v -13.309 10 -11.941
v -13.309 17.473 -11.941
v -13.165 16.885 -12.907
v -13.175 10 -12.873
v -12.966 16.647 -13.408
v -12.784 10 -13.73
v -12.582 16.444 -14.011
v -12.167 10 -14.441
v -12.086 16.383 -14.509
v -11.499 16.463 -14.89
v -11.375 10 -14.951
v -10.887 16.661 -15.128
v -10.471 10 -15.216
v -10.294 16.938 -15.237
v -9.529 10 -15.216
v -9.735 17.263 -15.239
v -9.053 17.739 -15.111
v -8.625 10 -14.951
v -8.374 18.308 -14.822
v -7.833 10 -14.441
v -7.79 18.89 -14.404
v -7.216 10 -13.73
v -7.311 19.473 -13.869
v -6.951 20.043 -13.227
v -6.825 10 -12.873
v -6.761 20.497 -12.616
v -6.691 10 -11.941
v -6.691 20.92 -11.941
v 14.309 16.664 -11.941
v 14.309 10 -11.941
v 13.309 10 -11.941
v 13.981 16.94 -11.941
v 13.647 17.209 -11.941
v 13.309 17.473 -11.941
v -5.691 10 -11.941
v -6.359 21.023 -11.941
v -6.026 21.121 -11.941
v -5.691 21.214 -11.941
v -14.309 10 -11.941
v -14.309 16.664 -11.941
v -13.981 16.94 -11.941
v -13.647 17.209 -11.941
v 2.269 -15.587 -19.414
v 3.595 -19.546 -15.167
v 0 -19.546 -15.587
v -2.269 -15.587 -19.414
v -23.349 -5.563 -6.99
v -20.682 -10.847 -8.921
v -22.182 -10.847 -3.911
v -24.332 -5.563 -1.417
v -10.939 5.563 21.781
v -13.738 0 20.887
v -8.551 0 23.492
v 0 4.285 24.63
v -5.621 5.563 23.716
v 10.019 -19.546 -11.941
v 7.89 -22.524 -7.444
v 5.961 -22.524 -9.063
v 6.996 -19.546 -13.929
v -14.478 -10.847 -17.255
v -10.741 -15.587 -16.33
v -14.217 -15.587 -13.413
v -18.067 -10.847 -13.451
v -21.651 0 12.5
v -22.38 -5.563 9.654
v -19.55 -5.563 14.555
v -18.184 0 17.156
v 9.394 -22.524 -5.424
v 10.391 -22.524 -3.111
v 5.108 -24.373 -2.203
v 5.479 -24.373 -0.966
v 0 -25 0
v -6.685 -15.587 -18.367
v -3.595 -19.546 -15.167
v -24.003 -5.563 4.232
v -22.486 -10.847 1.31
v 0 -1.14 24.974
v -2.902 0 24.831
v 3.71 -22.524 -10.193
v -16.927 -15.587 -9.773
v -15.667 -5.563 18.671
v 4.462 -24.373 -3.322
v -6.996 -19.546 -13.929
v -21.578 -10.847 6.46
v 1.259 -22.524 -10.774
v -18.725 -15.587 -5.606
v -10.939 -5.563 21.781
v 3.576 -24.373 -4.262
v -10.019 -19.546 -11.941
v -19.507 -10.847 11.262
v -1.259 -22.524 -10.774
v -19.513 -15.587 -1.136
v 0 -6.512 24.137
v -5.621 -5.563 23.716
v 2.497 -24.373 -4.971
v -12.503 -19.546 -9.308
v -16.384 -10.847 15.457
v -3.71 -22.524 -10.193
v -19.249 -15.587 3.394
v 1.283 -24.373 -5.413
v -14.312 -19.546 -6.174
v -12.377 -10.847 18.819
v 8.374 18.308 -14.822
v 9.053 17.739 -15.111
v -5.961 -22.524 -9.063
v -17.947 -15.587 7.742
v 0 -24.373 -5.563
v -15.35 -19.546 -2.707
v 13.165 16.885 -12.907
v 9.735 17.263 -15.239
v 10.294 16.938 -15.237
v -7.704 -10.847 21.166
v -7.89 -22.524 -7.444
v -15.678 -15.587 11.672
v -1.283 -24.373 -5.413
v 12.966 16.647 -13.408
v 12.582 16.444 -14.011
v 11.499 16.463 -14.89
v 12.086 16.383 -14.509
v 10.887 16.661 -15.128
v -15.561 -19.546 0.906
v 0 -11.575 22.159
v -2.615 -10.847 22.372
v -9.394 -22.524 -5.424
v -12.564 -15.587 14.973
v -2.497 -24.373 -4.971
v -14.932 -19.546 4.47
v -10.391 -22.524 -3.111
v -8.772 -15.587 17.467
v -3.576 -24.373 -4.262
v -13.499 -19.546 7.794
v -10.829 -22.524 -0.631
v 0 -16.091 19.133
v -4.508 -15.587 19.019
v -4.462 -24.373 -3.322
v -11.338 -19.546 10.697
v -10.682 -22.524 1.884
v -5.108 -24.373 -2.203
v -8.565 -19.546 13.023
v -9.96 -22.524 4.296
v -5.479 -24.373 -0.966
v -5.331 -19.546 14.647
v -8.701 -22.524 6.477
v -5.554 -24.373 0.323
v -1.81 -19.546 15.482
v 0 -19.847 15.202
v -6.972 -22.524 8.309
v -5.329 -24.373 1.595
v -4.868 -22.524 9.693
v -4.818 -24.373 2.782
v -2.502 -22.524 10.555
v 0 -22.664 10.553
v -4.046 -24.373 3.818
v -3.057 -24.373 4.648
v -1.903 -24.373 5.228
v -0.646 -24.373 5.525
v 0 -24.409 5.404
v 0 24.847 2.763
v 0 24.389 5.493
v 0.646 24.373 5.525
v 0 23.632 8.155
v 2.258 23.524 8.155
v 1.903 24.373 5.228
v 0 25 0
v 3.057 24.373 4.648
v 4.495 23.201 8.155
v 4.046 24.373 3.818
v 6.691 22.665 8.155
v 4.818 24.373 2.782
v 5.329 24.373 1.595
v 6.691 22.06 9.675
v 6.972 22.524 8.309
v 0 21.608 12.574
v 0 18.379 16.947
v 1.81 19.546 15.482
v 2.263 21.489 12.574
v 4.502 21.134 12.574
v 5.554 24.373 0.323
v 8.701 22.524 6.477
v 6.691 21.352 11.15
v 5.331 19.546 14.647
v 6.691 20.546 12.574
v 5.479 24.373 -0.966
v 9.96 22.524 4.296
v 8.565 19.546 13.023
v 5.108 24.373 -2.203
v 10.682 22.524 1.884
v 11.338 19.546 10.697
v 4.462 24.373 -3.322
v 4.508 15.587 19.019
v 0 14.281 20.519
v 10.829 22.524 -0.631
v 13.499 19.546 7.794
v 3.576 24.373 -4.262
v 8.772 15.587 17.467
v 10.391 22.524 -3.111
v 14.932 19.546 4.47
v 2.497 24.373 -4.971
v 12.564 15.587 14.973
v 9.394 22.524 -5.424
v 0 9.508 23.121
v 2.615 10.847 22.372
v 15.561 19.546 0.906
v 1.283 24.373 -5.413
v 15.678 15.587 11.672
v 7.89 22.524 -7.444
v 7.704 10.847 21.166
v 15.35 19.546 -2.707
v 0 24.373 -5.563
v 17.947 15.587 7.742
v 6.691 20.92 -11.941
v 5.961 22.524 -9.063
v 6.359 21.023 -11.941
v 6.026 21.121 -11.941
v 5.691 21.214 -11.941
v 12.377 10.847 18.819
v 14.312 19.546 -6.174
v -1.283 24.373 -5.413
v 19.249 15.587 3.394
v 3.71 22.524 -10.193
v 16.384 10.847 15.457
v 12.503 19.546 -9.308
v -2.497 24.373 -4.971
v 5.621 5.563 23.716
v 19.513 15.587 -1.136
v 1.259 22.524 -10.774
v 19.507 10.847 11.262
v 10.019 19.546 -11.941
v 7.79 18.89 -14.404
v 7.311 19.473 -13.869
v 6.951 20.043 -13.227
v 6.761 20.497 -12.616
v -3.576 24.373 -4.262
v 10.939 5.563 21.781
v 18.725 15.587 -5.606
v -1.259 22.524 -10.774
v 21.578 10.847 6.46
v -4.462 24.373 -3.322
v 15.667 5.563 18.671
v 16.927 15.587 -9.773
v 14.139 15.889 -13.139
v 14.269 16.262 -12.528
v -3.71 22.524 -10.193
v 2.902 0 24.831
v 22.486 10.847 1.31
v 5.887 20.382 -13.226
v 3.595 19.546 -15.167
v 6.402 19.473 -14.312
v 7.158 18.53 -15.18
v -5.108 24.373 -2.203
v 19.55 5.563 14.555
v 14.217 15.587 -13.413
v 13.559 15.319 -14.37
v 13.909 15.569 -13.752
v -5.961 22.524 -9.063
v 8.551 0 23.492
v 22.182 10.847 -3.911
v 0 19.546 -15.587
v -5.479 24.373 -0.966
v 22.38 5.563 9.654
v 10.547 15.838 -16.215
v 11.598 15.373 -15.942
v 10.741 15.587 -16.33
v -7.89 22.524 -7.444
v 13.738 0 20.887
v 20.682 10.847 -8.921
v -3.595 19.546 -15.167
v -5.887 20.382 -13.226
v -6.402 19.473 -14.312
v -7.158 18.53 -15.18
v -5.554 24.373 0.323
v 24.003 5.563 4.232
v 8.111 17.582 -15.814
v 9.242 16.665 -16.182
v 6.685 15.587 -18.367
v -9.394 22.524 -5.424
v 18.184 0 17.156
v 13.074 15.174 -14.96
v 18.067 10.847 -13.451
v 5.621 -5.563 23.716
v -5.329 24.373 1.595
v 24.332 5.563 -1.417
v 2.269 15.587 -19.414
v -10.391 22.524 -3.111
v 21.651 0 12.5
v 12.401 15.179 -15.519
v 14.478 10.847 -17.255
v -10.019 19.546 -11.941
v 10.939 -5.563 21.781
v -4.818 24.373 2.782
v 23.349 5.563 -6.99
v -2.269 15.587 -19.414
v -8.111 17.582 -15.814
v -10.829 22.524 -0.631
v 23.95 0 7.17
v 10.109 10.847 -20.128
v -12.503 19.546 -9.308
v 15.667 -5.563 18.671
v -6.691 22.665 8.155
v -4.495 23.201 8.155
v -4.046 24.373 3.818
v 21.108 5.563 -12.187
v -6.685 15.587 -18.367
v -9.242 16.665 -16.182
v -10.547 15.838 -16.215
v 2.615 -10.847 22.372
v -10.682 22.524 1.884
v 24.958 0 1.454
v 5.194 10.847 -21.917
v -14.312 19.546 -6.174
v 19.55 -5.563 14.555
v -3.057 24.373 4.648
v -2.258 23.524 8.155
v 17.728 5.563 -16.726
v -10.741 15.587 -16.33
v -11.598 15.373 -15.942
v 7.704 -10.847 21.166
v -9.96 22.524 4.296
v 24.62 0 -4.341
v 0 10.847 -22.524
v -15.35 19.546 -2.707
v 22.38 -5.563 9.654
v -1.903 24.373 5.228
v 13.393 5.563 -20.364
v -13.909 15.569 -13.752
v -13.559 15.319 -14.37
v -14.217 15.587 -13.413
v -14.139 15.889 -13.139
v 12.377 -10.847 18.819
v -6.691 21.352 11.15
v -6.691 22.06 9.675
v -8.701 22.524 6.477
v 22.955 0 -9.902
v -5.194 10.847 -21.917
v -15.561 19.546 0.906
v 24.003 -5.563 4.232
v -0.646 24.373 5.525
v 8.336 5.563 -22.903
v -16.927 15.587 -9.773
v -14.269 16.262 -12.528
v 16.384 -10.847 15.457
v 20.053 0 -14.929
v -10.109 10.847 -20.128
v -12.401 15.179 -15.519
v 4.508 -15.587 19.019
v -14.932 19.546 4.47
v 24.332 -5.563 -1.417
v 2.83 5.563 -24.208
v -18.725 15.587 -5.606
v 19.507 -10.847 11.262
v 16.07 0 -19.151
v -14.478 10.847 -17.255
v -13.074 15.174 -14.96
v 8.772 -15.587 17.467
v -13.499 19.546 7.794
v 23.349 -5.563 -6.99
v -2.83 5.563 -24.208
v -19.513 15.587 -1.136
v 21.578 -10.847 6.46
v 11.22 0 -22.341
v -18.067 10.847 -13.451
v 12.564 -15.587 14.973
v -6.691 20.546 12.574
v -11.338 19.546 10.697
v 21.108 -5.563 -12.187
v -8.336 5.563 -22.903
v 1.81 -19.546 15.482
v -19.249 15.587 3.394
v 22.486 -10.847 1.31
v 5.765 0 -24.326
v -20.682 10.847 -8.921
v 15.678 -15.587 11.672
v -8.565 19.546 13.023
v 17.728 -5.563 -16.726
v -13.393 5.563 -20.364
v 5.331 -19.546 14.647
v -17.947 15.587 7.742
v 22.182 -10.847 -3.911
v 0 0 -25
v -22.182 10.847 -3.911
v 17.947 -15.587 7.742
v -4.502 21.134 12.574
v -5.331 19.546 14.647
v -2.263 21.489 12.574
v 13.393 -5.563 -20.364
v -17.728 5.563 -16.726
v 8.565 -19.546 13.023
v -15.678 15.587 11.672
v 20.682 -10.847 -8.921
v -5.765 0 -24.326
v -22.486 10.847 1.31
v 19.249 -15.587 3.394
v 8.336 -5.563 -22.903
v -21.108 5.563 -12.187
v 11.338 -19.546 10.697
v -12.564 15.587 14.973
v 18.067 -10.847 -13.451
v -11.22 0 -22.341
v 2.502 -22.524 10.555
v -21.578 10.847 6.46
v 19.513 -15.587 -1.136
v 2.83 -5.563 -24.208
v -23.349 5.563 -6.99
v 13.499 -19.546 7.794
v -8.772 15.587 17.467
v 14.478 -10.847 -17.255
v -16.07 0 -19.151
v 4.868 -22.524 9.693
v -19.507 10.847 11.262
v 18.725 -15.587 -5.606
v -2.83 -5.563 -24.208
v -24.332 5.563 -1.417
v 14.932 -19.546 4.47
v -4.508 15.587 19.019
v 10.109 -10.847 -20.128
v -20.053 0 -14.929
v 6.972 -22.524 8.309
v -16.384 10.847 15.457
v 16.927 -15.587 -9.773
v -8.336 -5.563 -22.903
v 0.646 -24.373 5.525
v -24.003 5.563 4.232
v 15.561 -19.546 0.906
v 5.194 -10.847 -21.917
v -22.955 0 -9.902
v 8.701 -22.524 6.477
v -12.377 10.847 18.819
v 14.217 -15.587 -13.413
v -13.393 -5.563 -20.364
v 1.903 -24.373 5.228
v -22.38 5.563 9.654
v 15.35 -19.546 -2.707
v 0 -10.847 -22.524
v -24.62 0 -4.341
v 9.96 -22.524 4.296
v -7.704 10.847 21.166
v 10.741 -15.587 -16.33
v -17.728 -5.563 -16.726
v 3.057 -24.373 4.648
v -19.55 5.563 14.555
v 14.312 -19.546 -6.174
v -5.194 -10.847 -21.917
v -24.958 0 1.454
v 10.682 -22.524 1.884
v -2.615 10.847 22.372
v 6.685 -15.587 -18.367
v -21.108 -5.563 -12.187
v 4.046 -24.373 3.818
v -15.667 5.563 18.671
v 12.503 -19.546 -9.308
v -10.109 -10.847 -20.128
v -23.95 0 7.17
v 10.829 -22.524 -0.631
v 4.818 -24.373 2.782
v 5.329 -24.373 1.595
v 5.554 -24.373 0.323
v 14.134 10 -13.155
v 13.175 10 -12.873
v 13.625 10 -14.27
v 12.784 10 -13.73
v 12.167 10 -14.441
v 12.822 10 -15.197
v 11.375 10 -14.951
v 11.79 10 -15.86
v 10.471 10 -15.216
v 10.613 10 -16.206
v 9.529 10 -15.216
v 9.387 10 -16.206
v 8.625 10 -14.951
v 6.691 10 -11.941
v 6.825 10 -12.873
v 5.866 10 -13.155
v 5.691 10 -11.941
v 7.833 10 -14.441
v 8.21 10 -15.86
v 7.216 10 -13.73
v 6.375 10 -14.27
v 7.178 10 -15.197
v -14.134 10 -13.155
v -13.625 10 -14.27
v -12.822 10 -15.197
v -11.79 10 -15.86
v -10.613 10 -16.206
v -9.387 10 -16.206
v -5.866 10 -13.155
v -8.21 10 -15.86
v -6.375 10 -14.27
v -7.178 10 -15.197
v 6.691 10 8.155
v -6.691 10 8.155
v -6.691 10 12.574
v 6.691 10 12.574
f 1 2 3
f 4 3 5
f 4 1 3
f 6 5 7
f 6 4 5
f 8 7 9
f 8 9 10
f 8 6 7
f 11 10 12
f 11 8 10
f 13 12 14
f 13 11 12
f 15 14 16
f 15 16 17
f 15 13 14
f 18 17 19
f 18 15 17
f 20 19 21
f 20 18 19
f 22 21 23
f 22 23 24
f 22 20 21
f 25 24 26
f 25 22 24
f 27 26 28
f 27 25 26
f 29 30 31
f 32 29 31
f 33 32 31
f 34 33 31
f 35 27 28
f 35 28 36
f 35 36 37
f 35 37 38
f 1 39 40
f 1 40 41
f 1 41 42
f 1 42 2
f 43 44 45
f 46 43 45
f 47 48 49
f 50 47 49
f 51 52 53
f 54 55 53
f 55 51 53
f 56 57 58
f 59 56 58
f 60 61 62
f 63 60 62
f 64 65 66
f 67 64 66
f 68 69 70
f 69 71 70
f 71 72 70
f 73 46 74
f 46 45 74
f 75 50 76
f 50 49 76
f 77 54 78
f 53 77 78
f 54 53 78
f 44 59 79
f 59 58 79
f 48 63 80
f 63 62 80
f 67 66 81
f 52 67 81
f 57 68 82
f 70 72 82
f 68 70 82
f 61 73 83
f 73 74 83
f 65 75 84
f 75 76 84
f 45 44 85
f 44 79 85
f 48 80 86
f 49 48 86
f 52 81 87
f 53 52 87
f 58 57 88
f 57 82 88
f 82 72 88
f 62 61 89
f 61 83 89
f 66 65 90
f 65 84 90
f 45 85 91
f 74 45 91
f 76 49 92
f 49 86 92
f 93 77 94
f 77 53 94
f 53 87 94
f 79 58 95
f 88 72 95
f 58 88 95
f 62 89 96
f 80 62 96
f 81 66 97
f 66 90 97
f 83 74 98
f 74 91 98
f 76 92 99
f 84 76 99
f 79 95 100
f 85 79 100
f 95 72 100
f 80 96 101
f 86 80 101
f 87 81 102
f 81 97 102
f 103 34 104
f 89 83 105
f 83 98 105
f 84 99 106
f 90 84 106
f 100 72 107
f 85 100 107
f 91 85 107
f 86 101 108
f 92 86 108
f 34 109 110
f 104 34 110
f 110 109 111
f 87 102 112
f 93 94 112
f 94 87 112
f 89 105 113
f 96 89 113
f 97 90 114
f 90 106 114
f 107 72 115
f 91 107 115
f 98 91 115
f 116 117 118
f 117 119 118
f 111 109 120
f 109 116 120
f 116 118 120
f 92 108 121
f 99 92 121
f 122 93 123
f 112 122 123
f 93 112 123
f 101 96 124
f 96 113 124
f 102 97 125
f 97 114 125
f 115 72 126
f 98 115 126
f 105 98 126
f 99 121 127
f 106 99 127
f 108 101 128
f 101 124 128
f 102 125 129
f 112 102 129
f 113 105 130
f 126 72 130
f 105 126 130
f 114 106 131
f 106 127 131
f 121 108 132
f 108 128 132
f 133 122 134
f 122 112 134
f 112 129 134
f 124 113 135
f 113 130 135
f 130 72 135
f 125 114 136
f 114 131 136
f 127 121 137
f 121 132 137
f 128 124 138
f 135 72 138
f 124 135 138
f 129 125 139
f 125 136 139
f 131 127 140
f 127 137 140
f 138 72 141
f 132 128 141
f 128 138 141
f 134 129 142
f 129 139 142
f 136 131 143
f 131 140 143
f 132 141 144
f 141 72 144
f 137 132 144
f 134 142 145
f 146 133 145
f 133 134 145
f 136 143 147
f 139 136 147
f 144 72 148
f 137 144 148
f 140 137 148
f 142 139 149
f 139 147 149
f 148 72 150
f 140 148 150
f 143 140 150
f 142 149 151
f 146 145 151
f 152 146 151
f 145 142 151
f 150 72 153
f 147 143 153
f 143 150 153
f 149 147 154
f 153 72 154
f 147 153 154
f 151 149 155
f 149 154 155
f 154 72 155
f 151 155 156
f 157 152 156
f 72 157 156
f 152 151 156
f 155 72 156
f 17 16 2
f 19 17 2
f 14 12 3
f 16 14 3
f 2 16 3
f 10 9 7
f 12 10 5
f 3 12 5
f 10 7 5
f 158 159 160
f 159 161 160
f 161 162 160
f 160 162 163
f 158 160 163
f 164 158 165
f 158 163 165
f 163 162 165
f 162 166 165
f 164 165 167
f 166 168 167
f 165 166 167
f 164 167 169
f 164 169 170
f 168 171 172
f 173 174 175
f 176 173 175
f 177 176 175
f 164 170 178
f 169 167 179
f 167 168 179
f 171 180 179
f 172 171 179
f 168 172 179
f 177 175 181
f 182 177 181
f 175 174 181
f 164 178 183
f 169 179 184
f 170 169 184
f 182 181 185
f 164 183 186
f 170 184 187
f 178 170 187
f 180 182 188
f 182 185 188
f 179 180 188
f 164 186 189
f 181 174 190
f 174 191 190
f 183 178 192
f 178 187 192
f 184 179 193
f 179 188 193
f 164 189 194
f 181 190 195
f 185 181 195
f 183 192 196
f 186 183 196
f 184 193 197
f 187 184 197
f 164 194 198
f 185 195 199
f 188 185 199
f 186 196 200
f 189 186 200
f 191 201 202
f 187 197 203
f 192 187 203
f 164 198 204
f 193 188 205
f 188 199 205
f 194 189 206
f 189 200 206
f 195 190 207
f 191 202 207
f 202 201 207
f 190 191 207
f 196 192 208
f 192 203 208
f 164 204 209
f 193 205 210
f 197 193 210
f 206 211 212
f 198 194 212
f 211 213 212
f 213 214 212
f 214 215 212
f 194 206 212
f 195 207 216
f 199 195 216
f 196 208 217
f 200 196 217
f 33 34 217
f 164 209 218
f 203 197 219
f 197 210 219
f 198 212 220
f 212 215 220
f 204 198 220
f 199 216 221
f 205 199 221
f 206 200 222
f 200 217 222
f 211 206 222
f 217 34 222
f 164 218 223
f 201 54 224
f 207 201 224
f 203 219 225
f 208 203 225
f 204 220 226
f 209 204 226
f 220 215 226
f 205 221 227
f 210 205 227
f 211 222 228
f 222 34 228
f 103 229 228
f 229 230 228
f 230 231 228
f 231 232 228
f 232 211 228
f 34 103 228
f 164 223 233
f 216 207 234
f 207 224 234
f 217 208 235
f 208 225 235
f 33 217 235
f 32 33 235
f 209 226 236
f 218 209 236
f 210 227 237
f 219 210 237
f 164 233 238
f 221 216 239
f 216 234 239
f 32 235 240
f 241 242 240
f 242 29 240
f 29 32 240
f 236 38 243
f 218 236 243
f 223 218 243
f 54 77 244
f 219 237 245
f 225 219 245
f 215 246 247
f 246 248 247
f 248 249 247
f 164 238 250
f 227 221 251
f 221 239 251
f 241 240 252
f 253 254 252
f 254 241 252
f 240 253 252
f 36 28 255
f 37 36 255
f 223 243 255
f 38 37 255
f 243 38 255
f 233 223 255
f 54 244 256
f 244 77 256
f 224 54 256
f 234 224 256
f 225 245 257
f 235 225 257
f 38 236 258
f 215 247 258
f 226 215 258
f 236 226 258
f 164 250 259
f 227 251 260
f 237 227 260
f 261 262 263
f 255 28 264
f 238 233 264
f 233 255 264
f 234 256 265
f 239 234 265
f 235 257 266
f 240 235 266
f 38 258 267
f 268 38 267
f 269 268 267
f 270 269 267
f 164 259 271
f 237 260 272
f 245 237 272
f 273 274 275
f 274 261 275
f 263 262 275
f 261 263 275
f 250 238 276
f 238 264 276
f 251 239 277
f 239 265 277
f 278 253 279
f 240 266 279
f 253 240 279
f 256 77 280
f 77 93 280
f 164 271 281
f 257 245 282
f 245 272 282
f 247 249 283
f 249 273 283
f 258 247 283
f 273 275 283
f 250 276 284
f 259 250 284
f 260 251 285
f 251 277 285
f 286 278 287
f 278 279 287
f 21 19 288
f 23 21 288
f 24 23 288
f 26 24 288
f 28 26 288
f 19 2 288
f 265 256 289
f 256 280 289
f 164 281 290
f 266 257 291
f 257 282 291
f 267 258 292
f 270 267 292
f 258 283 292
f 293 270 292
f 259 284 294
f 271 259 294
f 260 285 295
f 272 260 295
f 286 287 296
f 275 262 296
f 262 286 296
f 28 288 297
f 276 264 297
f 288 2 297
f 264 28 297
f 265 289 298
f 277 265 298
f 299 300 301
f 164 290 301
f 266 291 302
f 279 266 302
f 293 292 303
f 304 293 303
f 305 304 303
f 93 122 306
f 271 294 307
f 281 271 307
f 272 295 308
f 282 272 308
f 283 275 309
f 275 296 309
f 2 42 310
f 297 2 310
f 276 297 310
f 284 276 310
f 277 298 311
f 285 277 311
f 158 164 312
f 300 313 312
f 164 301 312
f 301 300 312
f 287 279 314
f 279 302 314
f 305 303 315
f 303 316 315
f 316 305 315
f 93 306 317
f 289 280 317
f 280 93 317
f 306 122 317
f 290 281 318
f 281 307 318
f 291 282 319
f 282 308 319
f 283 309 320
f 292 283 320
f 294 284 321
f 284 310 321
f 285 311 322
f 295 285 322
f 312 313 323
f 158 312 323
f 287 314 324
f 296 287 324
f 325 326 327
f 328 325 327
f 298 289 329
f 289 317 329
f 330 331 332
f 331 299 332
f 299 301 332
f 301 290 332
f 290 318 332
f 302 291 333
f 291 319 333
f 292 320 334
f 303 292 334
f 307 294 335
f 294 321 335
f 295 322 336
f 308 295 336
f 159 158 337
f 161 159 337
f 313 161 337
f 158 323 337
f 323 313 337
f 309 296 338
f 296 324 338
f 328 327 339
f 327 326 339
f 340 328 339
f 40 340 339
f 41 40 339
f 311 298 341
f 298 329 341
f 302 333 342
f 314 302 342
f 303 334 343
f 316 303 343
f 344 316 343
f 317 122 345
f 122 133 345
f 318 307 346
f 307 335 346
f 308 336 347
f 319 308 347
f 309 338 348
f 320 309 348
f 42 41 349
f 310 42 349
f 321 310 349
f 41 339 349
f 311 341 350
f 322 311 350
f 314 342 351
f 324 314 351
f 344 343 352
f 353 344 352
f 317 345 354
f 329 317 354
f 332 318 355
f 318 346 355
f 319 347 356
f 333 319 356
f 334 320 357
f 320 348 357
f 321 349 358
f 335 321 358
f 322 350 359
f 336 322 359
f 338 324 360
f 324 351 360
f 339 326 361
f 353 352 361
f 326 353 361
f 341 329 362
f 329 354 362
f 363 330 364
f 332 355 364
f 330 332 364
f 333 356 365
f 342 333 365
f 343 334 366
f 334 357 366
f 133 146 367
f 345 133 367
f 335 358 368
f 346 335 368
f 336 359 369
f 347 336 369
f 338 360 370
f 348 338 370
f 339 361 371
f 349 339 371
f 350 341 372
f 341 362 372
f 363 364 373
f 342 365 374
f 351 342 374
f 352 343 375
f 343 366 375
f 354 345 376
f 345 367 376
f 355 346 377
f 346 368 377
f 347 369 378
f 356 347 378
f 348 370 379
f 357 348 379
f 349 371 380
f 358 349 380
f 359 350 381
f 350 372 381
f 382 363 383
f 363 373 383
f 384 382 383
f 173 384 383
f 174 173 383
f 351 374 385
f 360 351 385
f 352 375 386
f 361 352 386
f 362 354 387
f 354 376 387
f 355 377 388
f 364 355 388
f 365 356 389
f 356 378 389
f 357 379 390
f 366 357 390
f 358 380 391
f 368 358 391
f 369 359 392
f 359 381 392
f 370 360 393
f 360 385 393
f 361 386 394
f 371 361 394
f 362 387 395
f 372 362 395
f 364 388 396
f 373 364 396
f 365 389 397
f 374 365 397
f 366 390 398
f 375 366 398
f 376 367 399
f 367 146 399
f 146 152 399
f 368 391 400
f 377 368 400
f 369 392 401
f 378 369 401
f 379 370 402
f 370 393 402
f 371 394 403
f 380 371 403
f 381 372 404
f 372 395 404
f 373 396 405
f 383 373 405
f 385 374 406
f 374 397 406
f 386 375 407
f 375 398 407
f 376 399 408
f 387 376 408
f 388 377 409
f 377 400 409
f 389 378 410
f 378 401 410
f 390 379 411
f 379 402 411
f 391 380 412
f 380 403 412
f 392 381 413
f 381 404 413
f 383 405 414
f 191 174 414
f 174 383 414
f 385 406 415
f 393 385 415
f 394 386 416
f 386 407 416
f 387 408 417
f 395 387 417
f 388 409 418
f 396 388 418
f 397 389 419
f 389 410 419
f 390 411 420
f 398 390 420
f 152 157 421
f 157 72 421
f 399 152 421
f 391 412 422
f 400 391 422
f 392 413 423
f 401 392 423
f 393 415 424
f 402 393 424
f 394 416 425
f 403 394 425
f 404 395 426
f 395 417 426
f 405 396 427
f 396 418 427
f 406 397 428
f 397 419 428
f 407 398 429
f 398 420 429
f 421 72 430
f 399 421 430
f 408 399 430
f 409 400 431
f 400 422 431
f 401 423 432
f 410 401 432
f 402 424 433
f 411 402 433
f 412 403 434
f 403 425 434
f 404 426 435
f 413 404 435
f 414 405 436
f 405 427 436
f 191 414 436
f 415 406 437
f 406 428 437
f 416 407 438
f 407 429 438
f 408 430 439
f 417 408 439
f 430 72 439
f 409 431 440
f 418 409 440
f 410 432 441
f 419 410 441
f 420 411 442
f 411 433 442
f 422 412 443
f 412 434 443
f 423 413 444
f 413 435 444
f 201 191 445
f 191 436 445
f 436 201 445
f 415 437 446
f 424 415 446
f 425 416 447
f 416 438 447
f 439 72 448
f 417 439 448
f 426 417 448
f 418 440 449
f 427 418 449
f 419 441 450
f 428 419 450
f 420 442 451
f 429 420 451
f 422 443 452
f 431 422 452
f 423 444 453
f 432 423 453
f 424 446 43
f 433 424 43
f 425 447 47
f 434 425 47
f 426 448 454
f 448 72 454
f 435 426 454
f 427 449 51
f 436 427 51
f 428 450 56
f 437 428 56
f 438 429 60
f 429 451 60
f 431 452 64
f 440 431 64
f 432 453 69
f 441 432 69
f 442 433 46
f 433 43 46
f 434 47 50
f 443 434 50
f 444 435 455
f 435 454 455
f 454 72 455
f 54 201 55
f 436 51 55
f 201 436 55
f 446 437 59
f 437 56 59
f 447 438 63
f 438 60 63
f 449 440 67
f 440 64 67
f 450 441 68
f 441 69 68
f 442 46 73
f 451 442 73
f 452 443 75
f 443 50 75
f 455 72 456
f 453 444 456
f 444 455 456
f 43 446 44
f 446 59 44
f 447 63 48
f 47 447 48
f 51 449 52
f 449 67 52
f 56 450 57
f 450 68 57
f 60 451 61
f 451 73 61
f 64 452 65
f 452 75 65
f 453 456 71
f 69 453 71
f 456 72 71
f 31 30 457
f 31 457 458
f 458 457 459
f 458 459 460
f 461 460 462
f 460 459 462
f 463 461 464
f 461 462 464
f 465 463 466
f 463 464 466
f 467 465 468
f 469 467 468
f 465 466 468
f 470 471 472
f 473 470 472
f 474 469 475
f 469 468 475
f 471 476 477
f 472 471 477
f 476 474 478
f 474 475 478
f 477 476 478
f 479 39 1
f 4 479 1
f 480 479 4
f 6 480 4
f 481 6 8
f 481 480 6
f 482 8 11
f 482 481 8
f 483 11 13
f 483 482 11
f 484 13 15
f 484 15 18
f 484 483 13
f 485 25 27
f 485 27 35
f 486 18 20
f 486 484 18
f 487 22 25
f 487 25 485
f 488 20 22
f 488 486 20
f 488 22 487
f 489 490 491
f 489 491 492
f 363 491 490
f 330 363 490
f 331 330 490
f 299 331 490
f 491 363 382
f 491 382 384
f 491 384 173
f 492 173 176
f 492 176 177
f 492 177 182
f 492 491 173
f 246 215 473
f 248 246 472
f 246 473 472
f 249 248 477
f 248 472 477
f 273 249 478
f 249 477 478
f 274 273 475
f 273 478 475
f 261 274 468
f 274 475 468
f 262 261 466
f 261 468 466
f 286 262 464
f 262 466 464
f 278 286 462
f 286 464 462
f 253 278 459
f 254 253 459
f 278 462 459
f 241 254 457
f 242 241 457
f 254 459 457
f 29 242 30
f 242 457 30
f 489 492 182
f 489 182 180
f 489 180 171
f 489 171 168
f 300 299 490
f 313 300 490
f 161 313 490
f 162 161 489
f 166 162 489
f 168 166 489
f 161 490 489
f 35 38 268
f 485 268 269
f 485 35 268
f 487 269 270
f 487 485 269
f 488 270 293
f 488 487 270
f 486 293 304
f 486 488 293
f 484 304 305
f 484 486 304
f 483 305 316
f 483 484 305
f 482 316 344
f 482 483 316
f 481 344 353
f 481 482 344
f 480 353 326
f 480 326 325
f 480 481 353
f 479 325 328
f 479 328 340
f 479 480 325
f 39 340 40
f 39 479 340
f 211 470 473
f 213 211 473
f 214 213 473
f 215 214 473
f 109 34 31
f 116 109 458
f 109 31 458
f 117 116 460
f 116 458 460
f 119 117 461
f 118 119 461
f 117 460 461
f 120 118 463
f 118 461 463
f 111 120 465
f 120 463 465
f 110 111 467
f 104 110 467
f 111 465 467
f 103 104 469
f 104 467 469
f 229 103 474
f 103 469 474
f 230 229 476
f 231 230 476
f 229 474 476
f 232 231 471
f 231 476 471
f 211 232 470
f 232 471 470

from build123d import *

# Parameters (mm, degrees)
SKETCH_6_W          = 13.38221488
SKETCH_6_H          = 4.41838063
CUT_EXTRUDE_1_DEPTH = 50.749371855


with BuildPart() as part:
    # 草图4 → 旋转1 (revolve)
    with BuildSketch(Plane(origin=(0, 0, 0), x_dir=(0, 0, -1), z_dir=(1, 0, 0))):
        with BuildLine():
            Line((0, -25), (0, 0))
            Line((0, 0), (0, 17.552013601))
            Line((0, 17.552013601), (0, 25))
            ThreePointArc((0, 25), (-25, 0), (0, -25))
        make_face()
    revolve(axis=Axis((0, 0, 0), (0, 1, 0)))

    # 草图6 → 切除-拉伸1 (cut, through all)
    with BuildSketch(Plane(origin=(0, 10, 0), x_dir=(1, 0, 0), z_dir=(0, 1, 0))):
        with BuildLine():
            Line((-14.30889256, 11.940688041), (-13.30889256, 11.940688041))
            ThreePointArc((-13.30889256, 11.940688041), (-10, 15.2495806), (-6.69110744, 11.940688041))
            Line((-6.69110744, 11.940688041), (-5.69110744, 11.940688041))
            ThreePointArc((-5.69110744, 11.940688041), (-10, 16.2495806), (-14.30889256, 11.940688041))
        make_face()
        with Locations((0, -10.364363226)):
            Rectangle(SKETCH_6_W, SKETCH_6_H)
        with BuildLine():
            ThreePointArc((5.69110744, 11.940688041), (10, 16.2495806), (14.30889256, 11.940688041))
            Line((14.30889256, 11.940688041), (13.30889256, 11.940688041))
            ThreePointArc((13.30889256, 11.940688041), (10, 15.2495806), (6.69110744, 11.940688041))
            Line((6.69110744, 11.940688041), (5.69110744, 11.940688041))
        make_face()
    extrude(amount=CUT_EXTRUDE_1_DEPTH, mode=Mode.SUBTRACT)


solid = part.part
